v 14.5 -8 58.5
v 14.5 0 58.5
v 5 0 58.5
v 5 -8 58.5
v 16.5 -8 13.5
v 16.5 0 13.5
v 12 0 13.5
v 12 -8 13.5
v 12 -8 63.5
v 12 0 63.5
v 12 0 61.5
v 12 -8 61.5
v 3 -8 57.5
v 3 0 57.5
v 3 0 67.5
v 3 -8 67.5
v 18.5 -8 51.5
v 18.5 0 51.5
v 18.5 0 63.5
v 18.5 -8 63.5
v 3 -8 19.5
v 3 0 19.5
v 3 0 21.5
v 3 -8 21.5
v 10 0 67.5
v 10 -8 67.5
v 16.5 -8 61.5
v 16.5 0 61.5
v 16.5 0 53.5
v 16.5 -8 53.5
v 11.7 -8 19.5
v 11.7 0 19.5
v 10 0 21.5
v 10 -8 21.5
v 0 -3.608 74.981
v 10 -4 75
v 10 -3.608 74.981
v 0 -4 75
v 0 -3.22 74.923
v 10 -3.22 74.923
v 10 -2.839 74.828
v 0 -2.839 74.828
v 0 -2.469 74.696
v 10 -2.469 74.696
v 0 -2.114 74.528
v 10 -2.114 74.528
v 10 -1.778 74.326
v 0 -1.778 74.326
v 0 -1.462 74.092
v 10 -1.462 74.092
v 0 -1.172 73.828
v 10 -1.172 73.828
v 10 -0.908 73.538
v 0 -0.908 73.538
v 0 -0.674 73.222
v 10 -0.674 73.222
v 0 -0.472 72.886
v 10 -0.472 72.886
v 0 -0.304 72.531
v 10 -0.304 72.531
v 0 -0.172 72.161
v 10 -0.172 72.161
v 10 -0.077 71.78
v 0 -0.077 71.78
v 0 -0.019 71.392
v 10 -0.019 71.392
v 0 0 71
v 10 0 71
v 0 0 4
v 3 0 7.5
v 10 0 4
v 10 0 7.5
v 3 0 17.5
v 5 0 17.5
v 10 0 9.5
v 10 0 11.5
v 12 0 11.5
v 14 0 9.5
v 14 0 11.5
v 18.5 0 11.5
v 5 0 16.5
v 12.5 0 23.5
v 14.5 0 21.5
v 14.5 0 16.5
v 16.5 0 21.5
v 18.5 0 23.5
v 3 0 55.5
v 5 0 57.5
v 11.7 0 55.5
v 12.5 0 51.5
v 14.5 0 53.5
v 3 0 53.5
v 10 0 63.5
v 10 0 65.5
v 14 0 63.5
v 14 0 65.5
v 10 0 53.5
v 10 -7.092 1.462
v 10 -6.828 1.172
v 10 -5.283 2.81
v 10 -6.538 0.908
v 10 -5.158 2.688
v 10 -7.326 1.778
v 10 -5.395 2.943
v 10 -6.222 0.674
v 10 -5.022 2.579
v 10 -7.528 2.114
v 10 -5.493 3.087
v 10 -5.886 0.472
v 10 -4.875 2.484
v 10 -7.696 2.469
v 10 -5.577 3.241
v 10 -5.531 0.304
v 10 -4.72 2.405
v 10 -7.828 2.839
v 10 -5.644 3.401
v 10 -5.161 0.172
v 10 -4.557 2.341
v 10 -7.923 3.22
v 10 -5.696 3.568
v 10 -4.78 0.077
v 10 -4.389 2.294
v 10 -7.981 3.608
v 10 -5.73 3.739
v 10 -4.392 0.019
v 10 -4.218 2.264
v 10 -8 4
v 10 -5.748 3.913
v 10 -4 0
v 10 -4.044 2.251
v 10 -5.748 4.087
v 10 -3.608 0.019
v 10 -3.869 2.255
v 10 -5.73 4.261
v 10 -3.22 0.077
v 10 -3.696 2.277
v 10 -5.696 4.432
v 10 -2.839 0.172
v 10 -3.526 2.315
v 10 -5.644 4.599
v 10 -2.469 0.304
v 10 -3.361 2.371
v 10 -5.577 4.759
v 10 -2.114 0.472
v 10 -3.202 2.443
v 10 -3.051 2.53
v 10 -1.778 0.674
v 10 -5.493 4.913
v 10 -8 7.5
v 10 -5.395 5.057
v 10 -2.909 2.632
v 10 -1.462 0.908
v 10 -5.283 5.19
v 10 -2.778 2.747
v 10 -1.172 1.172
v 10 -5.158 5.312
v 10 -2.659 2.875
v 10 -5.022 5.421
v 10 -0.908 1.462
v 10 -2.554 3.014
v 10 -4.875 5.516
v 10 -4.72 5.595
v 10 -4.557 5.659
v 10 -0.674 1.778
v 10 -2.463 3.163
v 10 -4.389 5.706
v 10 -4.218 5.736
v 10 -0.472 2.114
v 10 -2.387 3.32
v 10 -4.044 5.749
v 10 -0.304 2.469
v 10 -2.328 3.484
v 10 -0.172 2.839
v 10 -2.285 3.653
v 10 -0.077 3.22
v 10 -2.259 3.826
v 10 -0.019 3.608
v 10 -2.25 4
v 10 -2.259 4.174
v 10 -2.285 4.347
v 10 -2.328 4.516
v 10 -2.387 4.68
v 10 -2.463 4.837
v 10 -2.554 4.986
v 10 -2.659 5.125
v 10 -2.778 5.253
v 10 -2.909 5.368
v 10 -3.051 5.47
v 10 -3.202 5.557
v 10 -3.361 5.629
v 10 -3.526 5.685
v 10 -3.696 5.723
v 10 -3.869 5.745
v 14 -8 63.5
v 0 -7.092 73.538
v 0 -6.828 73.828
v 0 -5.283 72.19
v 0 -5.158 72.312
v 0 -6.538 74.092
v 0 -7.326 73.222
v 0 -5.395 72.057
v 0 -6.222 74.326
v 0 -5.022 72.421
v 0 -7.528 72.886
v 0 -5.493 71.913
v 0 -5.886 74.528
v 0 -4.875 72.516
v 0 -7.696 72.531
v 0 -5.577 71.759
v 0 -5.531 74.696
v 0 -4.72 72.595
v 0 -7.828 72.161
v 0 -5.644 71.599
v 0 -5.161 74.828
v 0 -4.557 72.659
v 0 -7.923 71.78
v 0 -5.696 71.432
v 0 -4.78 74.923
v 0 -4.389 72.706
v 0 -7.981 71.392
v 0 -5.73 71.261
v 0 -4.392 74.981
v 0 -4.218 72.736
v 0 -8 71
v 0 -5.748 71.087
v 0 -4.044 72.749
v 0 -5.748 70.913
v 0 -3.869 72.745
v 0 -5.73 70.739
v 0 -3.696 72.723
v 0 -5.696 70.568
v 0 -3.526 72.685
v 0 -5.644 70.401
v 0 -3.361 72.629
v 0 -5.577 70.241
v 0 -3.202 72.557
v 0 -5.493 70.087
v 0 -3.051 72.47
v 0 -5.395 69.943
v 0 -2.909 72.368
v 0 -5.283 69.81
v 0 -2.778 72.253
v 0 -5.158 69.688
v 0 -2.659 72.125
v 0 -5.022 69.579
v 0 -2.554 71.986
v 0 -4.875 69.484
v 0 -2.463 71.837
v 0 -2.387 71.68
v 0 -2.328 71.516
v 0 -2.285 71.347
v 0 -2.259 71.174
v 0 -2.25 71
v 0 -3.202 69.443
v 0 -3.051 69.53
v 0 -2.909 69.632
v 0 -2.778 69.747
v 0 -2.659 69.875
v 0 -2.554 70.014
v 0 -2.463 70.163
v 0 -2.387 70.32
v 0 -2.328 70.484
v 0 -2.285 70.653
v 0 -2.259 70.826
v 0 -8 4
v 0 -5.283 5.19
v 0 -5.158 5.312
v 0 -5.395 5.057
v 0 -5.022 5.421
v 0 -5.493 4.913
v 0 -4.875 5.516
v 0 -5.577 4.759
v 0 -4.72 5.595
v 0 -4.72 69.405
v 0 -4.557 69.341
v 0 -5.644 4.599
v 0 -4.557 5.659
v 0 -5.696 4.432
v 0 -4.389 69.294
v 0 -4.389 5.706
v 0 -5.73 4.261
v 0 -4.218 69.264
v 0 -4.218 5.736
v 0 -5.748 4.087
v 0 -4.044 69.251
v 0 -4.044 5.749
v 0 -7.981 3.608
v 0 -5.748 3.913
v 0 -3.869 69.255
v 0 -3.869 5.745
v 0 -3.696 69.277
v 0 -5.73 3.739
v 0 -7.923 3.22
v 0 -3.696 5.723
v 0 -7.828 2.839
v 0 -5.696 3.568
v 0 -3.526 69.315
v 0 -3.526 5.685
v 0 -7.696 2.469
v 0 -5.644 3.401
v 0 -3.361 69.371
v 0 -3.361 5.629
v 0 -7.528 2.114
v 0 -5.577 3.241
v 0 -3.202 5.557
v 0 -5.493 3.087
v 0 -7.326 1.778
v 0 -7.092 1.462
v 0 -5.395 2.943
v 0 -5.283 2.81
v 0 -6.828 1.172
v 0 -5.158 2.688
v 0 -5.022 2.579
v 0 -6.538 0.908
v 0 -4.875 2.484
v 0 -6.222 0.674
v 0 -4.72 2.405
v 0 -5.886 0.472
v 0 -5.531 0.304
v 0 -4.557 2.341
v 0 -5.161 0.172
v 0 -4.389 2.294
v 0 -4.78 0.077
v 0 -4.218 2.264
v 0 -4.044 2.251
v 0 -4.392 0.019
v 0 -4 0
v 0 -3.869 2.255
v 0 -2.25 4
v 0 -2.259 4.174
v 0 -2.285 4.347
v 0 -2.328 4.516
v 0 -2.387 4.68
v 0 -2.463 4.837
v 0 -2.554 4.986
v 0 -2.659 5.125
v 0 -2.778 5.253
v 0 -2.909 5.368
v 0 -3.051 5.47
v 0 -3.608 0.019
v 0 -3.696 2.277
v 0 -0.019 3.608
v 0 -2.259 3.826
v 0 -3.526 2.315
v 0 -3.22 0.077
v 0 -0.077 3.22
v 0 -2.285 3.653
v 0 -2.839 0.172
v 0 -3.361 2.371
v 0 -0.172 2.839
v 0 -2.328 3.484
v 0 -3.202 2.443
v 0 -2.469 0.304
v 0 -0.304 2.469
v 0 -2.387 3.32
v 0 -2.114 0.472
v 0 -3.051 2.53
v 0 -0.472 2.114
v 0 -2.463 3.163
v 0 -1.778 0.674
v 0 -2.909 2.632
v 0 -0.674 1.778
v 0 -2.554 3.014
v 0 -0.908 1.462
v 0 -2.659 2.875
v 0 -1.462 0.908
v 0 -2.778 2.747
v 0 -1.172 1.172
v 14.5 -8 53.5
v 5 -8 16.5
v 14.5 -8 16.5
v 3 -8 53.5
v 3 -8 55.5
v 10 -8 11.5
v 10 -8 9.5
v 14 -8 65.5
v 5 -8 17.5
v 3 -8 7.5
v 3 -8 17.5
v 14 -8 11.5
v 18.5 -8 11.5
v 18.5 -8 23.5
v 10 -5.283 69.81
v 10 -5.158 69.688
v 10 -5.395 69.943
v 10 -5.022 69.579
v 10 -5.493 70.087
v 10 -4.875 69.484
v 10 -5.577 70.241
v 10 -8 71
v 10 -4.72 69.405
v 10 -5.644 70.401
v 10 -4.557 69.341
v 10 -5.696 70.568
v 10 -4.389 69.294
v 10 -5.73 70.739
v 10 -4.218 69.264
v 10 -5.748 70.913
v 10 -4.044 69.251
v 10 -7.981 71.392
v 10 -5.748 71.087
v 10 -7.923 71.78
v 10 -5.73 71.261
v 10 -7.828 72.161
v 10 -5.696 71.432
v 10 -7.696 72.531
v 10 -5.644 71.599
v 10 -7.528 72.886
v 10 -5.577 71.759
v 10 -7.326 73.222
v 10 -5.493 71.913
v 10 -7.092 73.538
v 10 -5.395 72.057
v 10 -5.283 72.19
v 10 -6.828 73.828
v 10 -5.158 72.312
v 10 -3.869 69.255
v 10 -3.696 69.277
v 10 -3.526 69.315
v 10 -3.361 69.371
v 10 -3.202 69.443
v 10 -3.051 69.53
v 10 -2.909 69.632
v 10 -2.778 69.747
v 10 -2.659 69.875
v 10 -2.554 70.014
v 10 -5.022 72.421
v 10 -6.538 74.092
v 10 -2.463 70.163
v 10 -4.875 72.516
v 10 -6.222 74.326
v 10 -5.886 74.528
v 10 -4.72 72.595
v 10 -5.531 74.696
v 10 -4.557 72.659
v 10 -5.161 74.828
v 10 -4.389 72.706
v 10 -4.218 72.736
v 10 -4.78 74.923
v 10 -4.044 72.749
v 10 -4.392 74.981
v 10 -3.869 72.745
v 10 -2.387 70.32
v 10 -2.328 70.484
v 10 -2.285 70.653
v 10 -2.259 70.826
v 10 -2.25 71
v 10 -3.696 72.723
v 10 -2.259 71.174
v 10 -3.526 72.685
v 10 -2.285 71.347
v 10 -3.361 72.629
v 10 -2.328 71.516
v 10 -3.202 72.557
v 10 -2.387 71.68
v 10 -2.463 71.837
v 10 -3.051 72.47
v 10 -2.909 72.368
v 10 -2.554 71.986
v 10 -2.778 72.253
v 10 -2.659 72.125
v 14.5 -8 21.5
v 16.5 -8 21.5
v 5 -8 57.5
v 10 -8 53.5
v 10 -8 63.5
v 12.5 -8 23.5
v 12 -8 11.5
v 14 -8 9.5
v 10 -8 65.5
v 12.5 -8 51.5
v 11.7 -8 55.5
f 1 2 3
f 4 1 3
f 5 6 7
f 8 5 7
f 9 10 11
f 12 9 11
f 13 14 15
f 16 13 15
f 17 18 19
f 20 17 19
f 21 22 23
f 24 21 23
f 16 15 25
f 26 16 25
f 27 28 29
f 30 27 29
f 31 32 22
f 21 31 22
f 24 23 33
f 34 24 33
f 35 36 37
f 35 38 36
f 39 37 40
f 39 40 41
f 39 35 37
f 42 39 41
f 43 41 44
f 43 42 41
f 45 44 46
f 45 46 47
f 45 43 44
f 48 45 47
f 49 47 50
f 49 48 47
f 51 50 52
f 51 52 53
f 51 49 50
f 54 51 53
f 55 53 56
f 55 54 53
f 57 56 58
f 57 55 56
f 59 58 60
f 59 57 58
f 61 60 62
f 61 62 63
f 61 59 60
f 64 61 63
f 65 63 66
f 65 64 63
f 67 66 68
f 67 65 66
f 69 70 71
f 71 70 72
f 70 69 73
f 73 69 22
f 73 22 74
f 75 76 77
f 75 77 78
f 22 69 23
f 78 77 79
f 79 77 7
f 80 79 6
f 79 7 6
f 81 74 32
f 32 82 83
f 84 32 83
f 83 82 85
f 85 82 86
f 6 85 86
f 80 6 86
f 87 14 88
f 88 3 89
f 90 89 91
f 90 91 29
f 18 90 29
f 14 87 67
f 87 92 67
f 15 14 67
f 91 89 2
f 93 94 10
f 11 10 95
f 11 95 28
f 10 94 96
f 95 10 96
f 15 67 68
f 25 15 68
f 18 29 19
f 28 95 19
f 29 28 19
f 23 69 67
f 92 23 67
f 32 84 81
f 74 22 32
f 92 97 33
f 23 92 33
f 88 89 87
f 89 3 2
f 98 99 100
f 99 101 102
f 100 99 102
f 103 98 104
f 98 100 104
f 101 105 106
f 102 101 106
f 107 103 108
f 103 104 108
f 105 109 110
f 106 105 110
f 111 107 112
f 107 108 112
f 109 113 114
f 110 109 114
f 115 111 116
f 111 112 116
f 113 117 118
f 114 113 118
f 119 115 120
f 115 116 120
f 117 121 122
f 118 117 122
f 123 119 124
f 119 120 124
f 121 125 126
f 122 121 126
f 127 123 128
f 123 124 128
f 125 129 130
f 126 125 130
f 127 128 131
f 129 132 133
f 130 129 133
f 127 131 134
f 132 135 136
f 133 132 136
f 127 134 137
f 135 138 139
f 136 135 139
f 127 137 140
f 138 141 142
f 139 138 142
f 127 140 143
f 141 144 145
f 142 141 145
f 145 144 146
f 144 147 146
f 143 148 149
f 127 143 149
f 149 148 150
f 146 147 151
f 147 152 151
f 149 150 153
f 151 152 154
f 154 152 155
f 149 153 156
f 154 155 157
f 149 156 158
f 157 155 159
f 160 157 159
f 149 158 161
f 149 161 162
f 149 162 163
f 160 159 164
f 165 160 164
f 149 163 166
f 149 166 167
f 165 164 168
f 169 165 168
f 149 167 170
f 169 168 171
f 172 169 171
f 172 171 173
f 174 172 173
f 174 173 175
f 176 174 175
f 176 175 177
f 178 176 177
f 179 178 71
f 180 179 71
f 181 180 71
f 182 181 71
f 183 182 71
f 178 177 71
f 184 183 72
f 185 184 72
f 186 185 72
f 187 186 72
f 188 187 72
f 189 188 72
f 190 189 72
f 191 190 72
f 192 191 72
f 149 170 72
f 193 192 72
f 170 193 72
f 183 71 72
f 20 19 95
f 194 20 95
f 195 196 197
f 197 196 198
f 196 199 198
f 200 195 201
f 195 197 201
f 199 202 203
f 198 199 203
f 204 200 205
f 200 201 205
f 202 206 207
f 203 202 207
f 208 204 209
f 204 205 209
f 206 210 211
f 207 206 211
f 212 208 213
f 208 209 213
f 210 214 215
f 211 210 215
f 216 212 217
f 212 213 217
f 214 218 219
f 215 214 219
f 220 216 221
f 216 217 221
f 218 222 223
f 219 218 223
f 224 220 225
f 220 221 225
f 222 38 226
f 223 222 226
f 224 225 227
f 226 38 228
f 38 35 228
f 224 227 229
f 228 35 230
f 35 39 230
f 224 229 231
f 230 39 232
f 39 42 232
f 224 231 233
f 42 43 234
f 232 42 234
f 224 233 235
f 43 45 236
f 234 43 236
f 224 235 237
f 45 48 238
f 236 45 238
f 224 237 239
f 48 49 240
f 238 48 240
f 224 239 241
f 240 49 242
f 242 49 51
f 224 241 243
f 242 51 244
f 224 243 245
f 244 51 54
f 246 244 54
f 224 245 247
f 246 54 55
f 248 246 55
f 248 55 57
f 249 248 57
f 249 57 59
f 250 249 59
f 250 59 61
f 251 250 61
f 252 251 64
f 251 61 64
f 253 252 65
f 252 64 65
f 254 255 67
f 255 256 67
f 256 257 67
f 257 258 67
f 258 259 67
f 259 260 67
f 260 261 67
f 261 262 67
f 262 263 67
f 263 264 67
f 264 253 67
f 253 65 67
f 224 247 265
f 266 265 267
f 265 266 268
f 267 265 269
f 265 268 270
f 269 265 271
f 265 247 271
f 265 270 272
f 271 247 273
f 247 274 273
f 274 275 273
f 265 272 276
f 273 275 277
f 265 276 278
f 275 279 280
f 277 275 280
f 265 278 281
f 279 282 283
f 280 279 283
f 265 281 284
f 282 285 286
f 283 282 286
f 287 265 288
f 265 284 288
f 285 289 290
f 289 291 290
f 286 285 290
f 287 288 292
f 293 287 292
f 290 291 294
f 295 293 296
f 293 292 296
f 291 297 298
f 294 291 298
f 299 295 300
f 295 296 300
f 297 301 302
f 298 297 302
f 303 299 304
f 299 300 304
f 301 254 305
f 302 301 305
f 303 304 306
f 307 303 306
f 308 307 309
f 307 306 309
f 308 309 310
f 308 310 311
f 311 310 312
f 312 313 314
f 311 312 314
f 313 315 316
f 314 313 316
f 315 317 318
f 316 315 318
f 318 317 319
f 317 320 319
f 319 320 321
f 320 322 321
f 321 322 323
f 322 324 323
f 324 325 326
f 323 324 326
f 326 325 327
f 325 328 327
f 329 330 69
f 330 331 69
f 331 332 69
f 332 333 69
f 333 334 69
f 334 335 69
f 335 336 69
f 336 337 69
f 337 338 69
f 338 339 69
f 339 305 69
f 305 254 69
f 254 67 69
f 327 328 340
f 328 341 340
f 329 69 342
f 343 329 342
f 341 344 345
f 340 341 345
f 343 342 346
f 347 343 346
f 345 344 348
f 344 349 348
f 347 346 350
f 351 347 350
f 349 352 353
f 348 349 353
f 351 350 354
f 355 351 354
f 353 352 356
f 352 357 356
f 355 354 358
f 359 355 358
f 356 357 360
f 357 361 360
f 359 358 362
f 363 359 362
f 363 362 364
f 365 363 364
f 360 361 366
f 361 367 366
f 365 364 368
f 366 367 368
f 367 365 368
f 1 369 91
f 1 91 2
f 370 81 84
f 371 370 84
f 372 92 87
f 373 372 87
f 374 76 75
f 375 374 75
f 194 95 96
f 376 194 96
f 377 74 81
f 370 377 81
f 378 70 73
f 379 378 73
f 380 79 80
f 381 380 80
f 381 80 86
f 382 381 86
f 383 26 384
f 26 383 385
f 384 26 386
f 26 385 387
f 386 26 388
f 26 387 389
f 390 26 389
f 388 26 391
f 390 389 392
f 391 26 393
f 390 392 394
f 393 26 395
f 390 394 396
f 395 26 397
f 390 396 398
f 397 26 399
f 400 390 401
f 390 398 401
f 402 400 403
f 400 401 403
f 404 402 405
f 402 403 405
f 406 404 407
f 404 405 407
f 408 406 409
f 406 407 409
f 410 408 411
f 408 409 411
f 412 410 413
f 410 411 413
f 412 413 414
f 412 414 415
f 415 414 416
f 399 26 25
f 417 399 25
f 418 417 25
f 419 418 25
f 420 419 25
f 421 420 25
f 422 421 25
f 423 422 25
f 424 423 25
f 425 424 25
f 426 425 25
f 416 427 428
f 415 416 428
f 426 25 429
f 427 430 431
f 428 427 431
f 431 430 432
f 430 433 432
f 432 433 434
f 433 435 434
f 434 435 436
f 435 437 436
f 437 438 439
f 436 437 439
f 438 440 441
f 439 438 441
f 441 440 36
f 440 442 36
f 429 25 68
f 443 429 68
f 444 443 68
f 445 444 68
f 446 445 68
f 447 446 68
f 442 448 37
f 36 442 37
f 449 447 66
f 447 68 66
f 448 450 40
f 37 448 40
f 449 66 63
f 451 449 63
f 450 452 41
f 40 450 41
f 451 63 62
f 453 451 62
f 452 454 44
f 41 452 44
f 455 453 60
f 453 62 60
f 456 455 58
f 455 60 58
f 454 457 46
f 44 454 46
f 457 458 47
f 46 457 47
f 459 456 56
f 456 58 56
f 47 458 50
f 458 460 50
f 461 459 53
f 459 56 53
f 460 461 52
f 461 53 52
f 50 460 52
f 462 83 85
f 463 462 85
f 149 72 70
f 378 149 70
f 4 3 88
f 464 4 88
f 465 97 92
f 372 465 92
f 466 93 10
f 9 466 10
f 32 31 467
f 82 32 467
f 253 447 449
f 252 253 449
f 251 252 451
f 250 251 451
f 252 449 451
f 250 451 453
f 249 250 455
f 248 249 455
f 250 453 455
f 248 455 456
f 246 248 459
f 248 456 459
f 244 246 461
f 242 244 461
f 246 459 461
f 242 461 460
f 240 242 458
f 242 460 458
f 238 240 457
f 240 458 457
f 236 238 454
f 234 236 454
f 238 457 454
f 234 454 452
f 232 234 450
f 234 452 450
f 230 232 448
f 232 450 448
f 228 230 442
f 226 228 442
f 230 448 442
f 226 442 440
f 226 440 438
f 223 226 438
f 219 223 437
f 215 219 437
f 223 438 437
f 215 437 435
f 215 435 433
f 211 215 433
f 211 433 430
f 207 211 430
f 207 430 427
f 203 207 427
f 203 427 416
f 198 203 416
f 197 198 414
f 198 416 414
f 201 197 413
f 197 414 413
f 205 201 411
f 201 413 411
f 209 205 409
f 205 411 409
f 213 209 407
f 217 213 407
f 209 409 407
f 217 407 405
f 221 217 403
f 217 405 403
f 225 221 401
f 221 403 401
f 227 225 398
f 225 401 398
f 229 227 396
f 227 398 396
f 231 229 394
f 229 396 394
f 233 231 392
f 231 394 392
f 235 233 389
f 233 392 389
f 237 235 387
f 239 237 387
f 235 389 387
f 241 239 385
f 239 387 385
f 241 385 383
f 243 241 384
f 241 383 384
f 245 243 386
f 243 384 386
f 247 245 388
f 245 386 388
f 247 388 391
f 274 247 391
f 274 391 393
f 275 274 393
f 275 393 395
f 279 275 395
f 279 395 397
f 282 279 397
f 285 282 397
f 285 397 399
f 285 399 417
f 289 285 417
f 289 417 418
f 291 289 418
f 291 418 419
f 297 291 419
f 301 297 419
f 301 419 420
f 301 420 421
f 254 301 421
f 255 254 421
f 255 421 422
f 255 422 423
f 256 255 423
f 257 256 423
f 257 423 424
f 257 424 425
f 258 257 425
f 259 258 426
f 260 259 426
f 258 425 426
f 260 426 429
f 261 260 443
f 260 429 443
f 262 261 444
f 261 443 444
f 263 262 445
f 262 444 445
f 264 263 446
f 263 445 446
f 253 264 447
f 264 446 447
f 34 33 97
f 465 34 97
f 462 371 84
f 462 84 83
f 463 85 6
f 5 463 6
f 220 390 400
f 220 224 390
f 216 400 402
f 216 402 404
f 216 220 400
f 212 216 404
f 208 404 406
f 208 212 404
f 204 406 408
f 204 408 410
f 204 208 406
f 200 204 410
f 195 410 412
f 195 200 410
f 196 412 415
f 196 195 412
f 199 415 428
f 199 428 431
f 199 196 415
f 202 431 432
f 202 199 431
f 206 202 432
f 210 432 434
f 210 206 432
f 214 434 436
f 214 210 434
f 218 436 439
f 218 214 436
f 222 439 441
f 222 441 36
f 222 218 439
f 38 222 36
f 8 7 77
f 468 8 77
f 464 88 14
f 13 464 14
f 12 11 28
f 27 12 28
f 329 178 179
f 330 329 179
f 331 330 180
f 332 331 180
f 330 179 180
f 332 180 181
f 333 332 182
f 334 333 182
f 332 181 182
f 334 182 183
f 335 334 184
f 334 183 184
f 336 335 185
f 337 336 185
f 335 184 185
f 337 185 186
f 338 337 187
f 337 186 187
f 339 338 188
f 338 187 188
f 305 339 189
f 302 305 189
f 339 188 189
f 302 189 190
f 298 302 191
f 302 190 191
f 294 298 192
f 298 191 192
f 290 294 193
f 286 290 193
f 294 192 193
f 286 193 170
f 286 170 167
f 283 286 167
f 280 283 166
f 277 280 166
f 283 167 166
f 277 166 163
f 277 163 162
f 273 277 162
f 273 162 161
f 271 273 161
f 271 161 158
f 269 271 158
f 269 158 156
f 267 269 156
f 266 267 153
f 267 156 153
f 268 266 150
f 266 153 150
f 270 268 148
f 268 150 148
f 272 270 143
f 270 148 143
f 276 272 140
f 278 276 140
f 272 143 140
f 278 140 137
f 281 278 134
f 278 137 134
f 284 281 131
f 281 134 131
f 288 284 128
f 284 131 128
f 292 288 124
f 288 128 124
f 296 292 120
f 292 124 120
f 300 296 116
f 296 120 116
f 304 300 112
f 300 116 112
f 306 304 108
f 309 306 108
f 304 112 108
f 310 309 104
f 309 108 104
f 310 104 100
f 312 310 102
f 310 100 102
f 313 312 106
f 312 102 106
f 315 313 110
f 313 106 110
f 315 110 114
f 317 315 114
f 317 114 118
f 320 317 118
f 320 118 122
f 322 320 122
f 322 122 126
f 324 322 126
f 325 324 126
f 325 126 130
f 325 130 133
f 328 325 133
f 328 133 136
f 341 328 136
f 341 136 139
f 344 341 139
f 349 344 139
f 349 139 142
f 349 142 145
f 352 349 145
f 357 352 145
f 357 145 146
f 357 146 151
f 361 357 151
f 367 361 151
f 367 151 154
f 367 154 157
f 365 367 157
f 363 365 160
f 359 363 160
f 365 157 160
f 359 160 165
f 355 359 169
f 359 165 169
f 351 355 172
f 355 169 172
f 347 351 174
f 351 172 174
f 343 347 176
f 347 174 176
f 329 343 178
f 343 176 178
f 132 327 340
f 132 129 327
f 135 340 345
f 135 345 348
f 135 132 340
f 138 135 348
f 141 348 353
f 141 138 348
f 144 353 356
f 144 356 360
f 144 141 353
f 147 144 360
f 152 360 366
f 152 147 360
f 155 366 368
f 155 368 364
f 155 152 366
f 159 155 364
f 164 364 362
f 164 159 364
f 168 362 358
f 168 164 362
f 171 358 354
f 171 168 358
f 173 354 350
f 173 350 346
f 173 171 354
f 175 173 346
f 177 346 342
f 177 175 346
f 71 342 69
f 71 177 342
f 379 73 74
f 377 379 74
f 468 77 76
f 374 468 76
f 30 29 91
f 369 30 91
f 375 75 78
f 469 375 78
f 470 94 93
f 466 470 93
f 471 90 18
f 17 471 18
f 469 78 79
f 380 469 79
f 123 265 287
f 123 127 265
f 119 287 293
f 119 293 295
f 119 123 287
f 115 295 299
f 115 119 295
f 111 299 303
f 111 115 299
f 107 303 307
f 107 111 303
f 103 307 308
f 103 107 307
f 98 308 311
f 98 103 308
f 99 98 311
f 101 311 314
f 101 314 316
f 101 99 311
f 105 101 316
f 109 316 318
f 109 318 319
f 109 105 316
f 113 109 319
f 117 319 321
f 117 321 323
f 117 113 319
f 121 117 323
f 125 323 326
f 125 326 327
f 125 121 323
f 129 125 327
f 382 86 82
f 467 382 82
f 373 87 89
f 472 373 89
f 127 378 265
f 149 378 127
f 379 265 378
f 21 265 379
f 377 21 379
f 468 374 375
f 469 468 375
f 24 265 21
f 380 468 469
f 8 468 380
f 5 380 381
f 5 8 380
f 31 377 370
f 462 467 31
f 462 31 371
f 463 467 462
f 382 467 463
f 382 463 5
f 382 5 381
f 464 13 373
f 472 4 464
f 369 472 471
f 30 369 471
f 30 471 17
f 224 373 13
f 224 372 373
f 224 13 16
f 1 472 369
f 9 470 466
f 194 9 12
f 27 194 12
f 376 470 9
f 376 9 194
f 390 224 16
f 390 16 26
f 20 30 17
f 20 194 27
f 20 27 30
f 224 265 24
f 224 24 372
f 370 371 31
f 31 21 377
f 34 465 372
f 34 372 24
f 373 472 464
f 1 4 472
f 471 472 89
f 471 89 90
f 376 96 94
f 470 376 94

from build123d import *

# Parameters (mm, degrees)
F1_DEPTH    = 8
F2_T4_DEPTH = 33.981320863
F3_T4_DEPTH = 33.981320863
F4_R        = 3.99999
F5_R        = 1.75
F6_DEPTH    = 10
F7_R        = 1.75
F8_DEPTH    = 10


# Not quite as in the source:
# - a fillet or chamfer that OpenCascade refuses, or shapes differently, is made with other operations: its cross-section is extruded or revolved along the edge and cut away or added
# - a fillet or chamfer is up to 0.001 mm smaller than in the source, because OpenCascade refuses the exact size


with BuildPart() as f1:
    # F0 (on Front) → F1 (new body)
    with BuildSketch(Plane.XZ):
        Polygon((14, 65.5), (10, 65.5), (10, 63.5), (12, 63.5), (12, 61.5), (16.5, 61.5), (16.5, 58.5), (16.5, 53.5), (14.5, 53.5), (14.5, 58.5), (10, 58.5), (10, 55.5), (11.5, 55.5), (11.5, 51.5), (18.5, 51.5), (18.5, 63.5), (14, 63.5), align=None)
        Polygon((10, 11.5), (10, 9.5), (14, 9.5), (14, 11.5), (18.5, 11.5), (18.5, 23.5), (11.5, 23.5), (11.5, 19.5), (10, 19.5), (10, 16.5), (14.5, 16.5), (14.5, 21.5), (16.5, 21.5), (16.5, 16.5), (16.5, 13.5), (12, 13.5), (12, 11.5), align=None)
        Polygon((0, 75), (0, 0), (10, 0), (10, 7.5), (3, 7.5), (3, 9.5), (3, 13.5), (3, 16.5), (3, 17.5), (5, 17.5), (5, 16.5), (10, 16.5), (10, 19.5), (3, 19.5), (3, 21.5), (10, 21.5), (10, 53.5), (3, 53.5), (3, 55.5), (10, 55.5), (10, 58.5), (5, 58.5), (5, 57.5), (3, 57.5), (3, 58.5), (3, 61.5), (3, 65.5), (3, 67.5), (10, 67.5), (10, 75), align=None)
    extrude(amount=F1_DEPTH)

    # F2: chamfer of 1 x 5 on 1 edges, made by hand


with BuildPart() as f2_tool2:
    # F2_s3 → F2_t4 (new body)
    with BuildSketch(Plane.XZ.offset(-12.9906604315)):
        Polygon((11.5, 56.5), (12.5, 51.5), (11.5, 51.5), align=None)
    extrude(amount=F2_T4_DEPTH)

    split(bisect_by=Plane.XY.offset(55.5), keep=Keep.BOTTOM)


with BuildPart() as f1_1:
    add(f1.part)

    # F2_t1: cut F2_tool2
    add(f2_tool2.part, mode=Mode.SUBTRACT)

    # F3: chamfer of 5 x 1 on 1 edges, made by hand


with BuildPart() as f3_tool2:
    # F3_s3 → F3_t4 (new body)
    with BuildSketch(Plane.XZ.offset(-12.9906604315)):
        Polygon((11.5, 18.5), (12.5, 23.5), (11.5, 23.5), align=None)
    extrude(amount=F3_T4_DEPTH)

    split(bisect_by=Plane.XY.offset(19.5), keep=Keep.TOP)


with BuildPart() as f1_2:
    add(f1_1.part)

    # F3_t1: cut F3_tool2
    add(f3_tool2.part, mode=Mode.SUBTRACT)

    # F4 (radius 4 in the source; OpenCascade refuses exactly that, so slightly less here)
    f4_edges = [f1_2.edges().sort_by_distance(p)[0] for p in [
        (5, -8, 75),
        (5, 0, 75),
        (5, -8, 0),
        (5, 0, 0),
    ]]
    fillet(f4_edges, radius=F4_R)

    # F5 (on face) → F6 (cut)
    with BuildSketch(Plane.YZ.offset(10)):
        with Locations((-4, 71)):
            Circle(F5_R)
    extrude(amount=-F6_DEPTH, mode=Mode.SUBTRACT)

    # F7 (on face) → F8 (cut)
    with BuildSketch(Plane.YZ.offset(10)):
        with Locations((-4, 4)):
            Circle(F7_R)
    extrude(amount=-F8_DEPTH, mode=Mode.SUBTRACT)


solid = f1_2.part
